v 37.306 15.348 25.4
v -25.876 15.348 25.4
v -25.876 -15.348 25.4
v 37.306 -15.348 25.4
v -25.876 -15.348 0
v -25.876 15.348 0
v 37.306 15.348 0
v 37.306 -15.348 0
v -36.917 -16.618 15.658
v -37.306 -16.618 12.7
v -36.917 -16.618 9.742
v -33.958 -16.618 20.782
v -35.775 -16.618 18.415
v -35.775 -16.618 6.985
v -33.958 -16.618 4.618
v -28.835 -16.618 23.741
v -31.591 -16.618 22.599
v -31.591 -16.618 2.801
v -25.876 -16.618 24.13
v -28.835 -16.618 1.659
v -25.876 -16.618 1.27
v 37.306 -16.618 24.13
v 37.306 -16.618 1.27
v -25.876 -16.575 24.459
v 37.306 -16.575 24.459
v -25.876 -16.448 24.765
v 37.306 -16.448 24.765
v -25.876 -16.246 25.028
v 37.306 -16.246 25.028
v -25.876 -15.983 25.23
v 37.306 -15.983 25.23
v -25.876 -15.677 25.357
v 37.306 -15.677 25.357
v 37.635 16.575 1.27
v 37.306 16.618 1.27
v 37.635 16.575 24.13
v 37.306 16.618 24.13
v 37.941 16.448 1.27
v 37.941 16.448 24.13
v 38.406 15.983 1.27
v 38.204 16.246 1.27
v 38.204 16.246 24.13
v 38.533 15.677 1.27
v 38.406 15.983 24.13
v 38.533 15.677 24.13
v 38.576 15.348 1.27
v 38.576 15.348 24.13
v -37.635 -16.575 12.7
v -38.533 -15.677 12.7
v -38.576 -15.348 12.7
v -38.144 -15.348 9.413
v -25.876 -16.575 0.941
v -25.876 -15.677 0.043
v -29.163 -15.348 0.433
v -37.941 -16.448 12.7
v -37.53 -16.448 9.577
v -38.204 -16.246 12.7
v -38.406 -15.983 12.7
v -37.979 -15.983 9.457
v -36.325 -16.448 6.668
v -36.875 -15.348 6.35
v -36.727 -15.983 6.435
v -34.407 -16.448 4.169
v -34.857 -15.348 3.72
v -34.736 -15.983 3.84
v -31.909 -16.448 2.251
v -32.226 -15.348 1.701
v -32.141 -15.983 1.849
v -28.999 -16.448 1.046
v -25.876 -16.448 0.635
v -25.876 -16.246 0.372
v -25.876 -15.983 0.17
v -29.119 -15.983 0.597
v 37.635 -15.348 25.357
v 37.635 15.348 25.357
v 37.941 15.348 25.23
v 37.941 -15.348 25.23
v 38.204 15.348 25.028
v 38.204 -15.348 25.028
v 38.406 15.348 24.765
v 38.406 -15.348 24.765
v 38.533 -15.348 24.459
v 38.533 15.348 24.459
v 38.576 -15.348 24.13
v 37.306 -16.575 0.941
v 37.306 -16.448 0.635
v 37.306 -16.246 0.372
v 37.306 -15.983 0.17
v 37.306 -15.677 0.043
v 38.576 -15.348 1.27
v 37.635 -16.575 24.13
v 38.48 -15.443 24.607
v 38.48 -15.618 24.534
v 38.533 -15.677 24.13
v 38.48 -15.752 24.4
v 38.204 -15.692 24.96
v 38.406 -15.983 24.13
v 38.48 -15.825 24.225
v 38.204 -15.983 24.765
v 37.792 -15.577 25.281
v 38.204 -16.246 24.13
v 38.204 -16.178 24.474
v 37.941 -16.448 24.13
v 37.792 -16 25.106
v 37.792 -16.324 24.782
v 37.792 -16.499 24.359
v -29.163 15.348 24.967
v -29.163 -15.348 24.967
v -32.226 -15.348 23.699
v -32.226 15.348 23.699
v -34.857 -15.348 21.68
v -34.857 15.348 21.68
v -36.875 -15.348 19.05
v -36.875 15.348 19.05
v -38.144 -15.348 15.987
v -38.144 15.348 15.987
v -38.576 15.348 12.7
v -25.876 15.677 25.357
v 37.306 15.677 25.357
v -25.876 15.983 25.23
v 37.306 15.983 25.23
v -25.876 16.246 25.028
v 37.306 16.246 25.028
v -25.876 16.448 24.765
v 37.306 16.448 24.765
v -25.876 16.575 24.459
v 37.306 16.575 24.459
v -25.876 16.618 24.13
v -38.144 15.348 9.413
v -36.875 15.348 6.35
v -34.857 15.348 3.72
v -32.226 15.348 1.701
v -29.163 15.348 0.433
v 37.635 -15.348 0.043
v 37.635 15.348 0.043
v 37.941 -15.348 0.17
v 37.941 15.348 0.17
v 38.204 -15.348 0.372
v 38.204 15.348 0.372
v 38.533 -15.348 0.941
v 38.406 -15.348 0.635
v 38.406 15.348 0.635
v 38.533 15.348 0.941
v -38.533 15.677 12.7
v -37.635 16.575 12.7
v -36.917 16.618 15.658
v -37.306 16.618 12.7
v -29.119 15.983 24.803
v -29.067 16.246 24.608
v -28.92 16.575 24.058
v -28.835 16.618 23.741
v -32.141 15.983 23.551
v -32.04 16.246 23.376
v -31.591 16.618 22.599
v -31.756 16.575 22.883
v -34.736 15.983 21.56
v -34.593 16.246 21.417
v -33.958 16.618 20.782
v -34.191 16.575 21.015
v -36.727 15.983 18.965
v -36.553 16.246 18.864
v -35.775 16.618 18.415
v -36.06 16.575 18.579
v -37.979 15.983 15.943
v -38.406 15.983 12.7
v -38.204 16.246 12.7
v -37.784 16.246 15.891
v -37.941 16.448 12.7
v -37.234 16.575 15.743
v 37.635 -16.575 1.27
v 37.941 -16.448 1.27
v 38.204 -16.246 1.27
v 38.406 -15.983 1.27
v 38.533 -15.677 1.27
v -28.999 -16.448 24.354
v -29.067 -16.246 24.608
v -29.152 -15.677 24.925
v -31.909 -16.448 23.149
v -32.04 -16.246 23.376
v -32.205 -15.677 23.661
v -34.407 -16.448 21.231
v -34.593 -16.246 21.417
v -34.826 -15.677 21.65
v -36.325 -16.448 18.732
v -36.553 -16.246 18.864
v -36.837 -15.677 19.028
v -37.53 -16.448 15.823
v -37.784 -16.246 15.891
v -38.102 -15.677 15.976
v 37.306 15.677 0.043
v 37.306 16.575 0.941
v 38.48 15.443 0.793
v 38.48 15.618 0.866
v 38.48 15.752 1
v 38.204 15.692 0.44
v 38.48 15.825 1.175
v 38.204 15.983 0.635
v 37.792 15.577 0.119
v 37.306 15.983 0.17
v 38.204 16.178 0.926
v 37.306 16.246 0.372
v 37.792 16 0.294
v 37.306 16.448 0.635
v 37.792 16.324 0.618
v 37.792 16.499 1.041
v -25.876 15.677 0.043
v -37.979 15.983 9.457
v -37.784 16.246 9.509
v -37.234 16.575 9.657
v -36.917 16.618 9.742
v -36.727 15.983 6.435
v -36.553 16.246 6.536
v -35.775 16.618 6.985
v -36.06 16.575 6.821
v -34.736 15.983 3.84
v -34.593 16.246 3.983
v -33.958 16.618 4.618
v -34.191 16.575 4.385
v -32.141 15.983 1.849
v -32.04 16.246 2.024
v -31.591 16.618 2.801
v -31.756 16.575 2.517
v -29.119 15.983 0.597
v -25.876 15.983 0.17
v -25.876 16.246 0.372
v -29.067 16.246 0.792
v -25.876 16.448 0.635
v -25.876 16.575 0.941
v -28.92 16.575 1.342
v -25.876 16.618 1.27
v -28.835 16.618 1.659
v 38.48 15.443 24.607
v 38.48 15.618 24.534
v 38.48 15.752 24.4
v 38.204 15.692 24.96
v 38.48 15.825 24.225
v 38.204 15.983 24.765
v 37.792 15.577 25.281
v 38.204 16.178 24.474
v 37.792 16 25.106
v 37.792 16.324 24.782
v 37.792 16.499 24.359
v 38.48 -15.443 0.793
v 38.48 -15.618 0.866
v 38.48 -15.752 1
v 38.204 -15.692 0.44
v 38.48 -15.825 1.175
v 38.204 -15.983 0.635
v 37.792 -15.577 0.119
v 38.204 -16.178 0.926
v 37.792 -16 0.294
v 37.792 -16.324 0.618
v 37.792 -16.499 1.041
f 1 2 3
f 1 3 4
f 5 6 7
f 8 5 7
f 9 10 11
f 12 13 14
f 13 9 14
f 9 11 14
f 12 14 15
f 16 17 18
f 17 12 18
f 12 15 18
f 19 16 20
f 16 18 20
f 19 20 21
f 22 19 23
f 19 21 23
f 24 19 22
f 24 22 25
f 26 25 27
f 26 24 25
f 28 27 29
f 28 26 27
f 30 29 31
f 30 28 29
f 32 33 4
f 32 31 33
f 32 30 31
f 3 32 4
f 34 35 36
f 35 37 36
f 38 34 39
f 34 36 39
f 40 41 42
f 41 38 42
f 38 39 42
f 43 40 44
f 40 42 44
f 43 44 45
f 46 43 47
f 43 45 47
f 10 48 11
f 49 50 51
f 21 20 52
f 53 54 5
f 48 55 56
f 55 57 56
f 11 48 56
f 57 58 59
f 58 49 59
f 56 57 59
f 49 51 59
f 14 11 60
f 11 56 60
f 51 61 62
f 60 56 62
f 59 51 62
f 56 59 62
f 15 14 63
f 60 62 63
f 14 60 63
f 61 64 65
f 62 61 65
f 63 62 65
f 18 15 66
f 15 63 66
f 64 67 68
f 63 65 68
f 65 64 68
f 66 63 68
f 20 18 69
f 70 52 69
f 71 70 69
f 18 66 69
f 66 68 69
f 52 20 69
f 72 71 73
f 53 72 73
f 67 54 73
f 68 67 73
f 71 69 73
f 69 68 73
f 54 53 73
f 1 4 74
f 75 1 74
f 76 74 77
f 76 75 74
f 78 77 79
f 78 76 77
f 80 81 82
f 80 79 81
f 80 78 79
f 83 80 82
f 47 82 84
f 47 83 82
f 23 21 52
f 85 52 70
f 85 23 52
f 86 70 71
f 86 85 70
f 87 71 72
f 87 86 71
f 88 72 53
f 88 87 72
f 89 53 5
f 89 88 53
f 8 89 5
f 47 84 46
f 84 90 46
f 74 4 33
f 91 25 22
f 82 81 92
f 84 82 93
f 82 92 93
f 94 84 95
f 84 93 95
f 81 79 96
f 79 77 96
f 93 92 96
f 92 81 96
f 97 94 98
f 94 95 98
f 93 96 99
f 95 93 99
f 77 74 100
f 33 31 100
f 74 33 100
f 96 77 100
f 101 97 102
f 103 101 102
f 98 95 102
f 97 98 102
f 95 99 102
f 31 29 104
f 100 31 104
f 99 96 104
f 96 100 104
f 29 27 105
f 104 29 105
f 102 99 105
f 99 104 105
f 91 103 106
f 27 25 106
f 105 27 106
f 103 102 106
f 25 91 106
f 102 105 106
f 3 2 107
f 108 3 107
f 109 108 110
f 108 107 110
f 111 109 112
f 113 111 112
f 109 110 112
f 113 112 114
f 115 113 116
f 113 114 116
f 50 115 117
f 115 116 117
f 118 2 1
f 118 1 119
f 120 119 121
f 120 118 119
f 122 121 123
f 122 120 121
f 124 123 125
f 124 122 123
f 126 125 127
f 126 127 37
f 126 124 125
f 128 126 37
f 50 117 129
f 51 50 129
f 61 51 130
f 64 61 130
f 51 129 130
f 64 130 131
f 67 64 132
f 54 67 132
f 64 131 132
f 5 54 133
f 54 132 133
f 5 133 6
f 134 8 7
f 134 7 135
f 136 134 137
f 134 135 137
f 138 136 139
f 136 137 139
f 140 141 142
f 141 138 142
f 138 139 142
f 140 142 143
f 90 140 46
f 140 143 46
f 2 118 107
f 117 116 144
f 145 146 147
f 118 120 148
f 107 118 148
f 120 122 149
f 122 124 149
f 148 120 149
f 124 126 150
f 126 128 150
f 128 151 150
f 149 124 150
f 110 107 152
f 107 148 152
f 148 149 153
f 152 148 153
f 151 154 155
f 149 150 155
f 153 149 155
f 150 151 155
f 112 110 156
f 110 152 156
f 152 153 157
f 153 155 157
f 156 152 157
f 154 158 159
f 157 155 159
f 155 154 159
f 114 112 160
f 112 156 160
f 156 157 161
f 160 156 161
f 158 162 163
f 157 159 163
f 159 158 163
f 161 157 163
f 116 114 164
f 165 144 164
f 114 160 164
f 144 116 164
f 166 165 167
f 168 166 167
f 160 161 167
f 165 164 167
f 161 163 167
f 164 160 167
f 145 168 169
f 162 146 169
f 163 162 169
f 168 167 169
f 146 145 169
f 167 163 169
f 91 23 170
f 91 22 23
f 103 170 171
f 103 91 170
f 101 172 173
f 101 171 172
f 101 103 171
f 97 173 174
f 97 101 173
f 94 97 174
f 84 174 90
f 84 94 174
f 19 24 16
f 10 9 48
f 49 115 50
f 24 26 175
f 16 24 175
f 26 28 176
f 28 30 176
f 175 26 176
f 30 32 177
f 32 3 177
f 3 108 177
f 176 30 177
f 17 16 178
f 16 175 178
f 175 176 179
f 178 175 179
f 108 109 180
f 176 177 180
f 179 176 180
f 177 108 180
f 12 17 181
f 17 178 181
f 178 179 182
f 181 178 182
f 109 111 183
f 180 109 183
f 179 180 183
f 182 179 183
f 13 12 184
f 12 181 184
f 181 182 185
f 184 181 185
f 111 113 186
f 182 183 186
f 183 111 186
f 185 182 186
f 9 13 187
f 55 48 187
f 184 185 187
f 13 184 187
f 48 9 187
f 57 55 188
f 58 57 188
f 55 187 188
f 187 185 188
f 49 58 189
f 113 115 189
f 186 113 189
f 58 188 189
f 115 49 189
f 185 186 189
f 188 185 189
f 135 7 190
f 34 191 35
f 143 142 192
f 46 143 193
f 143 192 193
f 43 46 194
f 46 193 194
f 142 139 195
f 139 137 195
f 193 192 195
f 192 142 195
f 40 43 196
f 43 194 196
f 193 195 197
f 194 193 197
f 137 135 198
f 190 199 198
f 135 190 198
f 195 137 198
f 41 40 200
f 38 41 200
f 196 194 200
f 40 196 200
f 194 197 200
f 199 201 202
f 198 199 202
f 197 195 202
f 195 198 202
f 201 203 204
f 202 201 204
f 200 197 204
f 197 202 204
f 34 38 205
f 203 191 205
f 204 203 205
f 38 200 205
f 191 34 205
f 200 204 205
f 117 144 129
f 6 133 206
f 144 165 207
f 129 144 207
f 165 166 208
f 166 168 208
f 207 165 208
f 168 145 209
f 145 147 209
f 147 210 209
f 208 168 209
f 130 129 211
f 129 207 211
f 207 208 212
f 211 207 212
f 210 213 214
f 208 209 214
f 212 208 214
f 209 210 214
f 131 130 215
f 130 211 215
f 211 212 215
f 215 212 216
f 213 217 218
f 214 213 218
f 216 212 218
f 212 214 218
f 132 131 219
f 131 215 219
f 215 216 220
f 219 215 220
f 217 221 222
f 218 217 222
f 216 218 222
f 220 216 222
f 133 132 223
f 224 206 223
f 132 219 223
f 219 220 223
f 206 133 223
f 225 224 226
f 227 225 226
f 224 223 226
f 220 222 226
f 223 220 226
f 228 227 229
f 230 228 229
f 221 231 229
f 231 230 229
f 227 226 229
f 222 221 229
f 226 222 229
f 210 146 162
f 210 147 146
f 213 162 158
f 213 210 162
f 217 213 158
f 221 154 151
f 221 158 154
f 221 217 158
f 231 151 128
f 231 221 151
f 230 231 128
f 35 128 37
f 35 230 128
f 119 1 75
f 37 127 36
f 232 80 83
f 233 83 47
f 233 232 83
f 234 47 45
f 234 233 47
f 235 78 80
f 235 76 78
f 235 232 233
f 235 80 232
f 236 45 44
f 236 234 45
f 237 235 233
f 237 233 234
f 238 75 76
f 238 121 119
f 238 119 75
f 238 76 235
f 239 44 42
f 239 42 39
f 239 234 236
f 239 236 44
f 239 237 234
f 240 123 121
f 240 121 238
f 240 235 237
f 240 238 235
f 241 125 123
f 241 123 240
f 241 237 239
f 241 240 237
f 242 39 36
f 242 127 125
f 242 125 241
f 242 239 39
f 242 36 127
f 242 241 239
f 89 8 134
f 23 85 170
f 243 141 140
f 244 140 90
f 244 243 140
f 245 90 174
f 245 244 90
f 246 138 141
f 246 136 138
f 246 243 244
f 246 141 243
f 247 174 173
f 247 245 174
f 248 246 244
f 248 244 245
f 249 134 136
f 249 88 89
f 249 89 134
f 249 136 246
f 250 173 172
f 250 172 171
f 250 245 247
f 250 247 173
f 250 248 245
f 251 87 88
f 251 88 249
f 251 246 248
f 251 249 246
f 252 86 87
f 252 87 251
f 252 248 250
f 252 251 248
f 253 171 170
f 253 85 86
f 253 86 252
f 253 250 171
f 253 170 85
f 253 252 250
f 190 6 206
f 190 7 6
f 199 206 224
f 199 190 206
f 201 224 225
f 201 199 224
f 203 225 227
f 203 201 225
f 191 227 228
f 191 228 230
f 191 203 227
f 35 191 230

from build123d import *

# Parameters (mm, degrees)
SKETCH1_W           = 77.1525
SKETCH1_H           = 33.2359
BOSS_EXTRUDE1_DEPTH = 25.4
CUT_EXTRUDE1_DEPTH  = 57.902654708
FILLET1_R           = 1.27


with BuildPart() as part:
    # Sketch1 → Boss-Extrude1 (new body)
    with BuildSketch(Plane.XY):
        Rectangle(SKETCH1_W, SKETCH1_H)
    extrude(amount=BOSS_EXTRUDE1_DEPTH)

    # Sketch2 → Cut-Extrude1 (cut, through all)
    with BuildSketch(Plane(origin=(0, 16.61795, 0), x_dir=(1, 0, 0), z_dir=(0, 1, 0))):
        with BuildLine():
            Line((-25.87625, 0), (-51.27625, 0))
            Line((-51.27625, 0), (-51.27625, -25.4))
            Line((-51.27625, -25.4), (-25.87625, -25.4))
            ThreePointArc((-25.87625, -25.4), (-34.856506121, -21.680256121), (-38.57625, -12.7))
            ThreePointArc((-38.57625, -12.7), (-34.856506121, -3.719743879), (-25.87625, 0))
        make_face()
    extrude(amount=-CUT_EXTRUDE1_DEPTH, mode=Mode.SUBTRACT)

    # Fillet1
    fillet1_edges = [part.edges().sort_by_distance(p)[0] for p in [
        (6.35, -16.61795, 0),
        (6.35, -16.61795, 25.4),
        (-38.57625, -16.61795, 12.7),
        (-38.57625, 16.61795, 12.7),
        (38.57625, 0, 25.4),
        (6.35, 16.61795, 0),
        (38.57625, 0, 0),
        (38.57625, -16.61795, 12.7),
        (38.57625, 16.61795, 12.7),
        (6.35, 16.61795, 25.4),
    ]]
    fillet(fillet1_edges, radius=FILLET1_R)


solid = part.part
